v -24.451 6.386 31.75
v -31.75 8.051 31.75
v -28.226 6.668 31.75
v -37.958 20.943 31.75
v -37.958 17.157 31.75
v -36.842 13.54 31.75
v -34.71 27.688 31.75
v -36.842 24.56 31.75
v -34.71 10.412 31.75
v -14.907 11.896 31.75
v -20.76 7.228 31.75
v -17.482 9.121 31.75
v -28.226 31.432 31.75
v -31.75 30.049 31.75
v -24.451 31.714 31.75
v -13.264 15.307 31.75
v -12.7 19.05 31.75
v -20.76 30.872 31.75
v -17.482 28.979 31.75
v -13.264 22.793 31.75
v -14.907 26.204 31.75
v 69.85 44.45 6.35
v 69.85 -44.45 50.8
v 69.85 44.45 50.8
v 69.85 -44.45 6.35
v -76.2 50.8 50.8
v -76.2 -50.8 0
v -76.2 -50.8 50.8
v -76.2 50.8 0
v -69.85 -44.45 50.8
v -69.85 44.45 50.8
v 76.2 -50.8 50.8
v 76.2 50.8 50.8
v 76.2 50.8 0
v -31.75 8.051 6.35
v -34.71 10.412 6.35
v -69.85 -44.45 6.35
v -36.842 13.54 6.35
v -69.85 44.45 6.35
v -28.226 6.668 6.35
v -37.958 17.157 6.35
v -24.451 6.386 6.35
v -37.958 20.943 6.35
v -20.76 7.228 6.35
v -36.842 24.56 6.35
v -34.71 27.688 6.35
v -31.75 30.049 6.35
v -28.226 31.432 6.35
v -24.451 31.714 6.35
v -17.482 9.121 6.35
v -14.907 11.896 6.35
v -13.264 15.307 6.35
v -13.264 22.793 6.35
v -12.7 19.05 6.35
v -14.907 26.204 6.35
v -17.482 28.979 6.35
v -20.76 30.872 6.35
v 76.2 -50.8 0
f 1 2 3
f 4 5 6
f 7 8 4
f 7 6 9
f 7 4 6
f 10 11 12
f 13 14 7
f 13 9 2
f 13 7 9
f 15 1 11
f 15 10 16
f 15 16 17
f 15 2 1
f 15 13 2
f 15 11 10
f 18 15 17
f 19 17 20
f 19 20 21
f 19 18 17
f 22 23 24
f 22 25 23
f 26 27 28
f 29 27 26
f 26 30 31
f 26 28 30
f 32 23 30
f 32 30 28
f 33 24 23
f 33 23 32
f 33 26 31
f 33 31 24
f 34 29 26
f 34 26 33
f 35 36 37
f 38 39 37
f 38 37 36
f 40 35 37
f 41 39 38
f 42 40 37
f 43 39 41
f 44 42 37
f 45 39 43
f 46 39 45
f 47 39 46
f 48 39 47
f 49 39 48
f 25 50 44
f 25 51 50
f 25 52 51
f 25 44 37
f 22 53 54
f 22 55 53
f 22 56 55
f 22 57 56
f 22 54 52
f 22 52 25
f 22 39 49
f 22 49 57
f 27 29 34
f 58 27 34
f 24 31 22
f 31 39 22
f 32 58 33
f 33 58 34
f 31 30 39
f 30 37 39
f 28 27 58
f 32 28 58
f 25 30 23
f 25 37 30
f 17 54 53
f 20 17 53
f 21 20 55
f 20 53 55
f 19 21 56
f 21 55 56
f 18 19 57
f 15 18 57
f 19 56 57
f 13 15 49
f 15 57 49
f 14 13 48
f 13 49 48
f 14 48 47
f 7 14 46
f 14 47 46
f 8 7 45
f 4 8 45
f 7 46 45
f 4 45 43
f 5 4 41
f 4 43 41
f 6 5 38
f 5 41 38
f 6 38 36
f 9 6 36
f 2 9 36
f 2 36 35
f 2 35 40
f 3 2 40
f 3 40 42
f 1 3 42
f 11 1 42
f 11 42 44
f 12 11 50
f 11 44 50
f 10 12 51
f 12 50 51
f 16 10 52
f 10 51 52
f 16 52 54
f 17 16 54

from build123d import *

# Parameters (mm, degrees)
F0_W     = 152.4
F0_H     = 101.6
F1_DEPTH = 50.8
F2_T     = -6.35
F3_R     = 12.7
F4_DEPTH = 25.4


with BuildPart() as f1:
    # F0 (on Top) → F1 (new body)
    with BuildSketch(Plane.XY):
        Rectangle(F0_W, F0_H)
    extrude(amount=F1_DEPTH)

    # F2
    f2_openings = [f1.faces().sort_by_distance(p)[0] for p in [
        (0, 0, 50.8),
    ]]
    offset(amount=F2_T, openings=f2_openings)

    # F3 (on face) → F4 (join)
    with BuildSketch(Plane.XY.offset(6.35)):
        with Locations((-25.4, 19.05)):
            Circle(F3_R)
    extrude(amount=F4_DEPTH)


solid = f1.part
